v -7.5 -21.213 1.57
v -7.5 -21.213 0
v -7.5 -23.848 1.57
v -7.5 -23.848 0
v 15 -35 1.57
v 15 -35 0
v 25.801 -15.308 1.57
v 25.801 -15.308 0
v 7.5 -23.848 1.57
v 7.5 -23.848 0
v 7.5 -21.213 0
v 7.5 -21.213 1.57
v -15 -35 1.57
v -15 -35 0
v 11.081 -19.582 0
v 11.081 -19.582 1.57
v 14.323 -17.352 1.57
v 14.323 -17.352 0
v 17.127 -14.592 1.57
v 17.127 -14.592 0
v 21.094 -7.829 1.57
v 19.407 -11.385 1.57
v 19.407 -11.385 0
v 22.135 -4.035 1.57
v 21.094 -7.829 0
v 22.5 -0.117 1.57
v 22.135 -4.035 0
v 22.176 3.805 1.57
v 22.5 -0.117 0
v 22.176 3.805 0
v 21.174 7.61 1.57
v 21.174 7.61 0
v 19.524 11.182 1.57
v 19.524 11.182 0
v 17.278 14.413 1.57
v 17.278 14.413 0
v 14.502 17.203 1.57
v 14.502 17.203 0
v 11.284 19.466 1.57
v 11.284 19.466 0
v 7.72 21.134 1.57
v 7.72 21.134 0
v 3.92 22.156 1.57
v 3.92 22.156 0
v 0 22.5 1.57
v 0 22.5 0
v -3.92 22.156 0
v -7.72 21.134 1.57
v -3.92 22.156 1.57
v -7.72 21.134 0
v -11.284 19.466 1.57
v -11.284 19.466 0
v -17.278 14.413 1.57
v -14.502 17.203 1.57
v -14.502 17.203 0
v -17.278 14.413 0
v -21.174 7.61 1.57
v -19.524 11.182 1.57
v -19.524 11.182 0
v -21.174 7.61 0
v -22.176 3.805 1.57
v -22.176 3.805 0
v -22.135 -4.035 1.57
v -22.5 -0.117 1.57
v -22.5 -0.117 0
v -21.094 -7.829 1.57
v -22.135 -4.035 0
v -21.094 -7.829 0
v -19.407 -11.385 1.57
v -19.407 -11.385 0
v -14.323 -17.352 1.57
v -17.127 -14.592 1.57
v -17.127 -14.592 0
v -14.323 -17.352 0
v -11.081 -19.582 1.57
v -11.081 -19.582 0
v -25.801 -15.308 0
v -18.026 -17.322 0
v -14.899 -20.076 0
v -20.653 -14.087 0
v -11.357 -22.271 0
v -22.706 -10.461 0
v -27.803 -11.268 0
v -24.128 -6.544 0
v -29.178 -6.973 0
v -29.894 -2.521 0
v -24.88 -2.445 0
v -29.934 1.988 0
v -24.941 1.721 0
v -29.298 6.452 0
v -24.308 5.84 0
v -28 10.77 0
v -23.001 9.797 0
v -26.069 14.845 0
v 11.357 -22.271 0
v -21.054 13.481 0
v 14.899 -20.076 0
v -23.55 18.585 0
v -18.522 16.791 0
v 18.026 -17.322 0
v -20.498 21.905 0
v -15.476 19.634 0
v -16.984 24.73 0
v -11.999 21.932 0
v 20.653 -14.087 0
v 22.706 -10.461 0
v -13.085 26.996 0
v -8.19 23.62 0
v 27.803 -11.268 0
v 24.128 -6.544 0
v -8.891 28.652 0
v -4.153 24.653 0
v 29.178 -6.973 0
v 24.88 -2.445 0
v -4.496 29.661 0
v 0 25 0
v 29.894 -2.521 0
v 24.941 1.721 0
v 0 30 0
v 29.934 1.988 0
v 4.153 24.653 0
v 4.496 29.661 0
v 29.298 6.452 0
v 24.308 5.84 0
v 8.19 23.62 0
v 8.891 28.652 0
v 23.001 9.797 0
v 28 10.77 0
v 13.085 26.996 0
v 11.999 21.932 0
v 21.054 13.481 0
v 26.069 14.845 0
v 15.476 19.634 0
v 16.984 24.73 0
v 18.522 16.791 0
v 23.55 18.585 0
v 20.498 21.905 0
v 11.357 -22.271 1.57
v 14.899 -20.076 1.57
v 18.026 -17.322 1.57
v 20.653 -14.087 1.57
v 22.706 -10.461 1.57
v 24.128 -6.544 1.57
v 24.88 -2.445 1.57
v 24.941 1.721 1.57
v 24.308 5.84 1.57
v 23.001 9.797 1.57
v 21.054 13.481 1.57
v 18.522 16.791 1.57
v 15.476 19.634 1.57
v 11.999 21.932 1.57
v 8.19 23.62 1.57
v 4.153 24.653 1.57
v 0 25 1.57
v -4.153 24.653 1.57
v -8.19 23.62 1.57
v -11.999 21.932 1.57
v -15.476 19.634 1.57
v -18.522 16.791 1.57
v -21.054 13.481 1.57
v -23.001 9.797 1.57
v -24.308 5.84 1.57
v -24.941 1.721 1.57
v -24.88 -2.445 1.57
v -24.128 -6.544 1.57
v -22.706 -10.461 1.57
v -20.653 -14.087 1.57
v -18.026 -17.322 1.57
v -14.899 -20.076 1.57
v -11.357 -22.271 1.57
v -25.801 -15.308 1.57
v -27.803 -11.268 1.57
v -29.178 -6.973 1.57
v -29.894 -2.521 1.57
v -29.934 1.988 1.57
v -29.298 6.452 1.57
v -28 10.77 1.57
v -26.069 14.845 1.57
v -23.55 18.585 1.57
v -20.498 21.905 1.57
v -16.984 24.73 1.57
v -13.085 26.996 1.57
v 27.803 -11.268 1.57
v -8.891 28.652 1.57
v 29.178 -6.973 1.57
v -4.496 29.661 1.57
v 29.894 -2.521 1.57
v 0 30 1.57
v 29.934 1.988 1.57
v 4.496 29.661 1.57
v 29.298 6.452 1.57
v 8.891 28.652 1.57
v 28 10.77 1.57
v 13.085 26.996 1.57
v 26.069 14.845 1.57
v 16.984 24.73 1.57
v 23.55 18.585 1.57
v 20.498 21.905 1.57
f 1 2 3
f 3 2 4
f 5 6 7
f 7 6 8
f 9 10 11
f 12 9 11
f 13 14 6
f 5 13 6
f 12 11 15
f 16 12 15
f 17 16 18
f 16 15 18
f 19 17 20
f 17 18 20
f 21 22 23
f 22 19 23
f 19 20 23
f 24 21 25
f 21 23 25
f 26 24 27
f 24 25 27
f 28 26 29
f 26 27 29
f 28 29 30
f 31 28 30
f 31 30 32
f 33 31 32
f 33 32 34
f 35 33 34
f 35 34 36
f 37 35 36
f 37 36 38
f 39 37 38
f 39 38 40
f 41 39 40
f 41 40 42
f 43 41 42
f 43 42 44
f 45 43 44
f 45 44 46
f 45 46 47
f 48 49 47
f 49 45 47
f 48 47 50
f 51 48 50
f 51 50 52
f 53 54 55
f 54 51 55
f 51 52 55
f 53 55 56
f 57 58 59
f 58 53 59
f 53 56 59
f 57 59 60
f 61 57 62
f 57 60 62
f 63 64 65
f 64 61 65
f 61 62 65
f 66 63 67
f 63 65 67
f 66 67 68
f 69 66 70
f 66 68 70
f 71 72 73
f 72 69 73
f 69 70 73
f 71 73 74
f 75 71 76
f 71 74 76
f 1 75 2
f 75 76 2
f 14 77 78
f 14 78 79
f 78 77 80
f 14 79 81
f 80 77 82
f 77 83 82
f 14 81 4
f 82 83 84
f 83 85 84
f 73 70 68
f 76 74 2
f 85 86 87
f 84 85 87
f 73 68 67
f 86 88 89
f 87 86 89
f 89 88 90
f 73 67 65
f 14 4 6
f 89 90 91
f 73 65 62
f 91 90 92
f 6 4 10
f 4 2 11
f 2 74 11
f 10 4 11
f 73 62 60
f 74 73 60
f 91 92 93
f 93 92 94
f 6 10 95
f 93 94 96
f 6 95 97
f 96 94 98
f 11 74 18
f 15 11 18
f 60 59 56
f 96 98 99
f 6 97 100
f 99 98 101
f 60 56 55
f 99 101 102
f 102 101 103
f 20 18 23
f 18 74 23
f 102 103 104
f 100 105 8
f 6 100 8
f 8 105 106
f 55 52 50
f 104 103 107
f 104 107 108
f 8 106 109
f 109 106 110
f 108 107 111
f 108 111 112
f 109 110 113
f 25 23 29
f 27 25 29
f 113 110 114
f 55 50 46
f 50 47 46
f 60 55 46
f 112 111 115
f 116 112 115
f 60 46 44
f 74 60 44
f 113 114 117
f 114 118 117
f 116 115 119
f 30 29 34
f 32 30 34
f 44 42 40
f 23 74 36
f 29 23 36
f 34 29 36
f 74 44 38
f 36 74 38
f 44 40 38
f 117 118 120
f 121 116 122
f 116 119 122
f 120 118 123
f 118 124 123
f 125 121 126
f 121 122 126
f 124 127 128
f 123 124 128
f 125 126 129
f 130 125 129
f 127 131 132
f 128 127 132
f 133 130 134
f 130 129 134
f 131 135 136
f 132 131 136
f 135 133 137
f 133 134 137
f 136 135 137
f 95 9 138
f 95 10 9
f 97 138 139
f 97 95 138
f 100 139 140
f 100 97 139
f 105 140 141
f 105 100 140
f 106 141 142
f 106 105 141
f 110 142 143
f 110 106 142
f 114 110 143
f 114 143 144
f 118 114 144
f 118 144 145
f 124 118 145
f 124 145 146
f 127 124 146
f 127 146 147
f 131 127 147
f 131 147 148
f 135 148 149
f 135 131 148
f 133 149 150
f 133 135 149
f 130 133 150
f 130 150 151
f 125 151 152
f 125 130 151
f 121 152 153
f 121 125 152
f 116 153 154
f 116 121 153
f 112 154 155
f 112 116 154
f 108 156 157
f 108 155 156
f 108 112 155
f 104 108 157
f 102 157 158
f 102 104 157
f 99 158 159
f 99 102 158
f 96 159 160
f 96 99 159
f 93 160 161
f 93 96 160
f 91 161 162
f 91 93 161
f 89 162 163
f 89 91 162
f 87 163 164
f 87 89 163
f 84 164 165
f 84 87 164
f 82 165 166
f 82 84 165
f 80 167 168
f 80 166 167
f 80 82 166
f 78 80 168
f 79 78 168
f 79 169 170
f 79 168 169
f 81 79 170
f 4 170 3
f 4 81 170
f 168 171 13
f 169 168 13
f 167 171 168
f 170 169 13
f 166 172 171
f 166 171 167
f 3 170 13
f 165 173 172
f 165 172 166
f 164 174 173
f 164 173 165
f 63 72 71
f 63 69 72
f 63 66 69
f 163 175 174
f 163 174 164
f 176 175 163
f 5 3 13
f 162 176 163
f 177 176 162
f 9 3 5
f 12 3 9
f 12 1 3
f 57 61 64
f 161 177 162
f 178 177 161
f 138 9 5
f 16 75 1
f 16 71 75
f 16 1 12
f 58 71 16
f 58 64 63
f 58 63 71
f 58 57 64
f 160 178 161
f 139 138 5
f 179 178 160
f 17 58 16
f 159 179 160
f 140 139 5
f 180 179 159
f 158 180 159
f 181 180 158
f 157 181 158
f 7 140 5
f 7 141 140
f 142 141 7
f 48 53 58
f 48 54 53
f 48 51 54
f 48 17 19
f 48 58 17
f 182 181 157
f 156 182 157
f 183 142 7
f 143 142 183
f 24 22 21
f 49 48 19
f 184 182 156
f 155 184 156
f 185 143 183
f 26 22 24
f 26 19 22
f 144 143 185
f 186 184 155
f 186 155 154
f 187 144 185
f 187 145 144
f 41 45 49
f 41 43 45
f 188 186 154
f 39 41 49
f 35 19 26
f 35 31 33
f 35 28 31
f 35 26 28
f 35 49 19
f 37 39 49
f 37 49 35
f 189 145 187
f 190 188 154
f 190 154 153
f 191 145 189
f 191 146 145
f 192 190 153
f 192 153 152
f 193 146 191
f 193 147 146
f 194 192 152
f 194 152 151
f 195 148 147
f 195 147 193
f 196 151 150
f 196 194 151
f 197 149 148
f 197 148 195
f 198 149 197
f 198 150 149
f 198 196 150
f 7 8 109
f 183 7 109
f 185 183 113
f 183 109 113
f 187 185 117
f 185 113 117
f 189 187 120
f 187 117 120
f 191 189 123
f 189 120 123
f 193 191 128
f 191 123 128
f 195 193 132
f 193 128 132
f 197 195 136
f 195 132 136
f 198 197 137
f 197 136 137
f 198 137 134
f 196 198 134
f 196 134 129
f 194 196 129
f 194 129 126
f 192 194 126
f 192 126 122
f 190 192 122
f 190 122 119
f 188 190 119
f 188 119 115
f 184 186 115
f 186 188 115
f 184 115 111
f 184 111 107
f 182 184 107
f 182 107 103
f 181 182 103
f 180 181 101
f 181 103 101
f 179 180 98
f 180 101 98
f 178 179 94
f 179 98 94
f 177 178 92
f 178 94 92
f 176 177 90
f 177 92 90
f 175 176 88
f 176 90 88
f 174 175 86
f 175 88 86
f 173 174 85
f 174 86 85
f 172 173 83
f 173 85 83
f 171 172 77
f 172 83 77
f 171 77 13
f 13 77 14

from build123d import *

# Parameters (mm, degrees)
ESBO_O1_R           = 30
ESBO_O1_R_2         = 25
BOSS_EXTRUDE1_DEPTH = 1.57
BOSS_EXTRUDE2_START = -1.57
BOSS_EXTRUDE2_DEPTH = 1.57
BOSS_EXTRUDE3_DEPTH = 1.57
BOSS_EXTRUDE4_START = -1.57
SKETCH4_R           = 22.5
BOSS_EXTRUDE4_DEPTH = 1.57


with BuildPart() as part:
    # Esboço1 → Boss-Extrude1 (new body)
    with BuildSketch(Plane.XY):
        Circle(ESBO_O1_R)
        Circle(ESBO_O1_R_2, mode=Mode.SUBTRACT)
    extrude(amount=BOSS_EXTRUDE1_DEPTH)

    # Sketch1 → Boss-Extrude2 (add)
    with BuildSketch(Plane.XY.offset(1.57).offset(BOSS_EXTRUDE2_START)):
        with BuildLine():
            Line((-25.800536663, -15.307916512), (-15, -35))
            Line((-15, -35), (-15, -25.980762114))
            ThreePointArc((-15, -25.980762114), (-21.086686707, -21.338970071), (-25.800536663, -15.307916512))
        make_face()
        with BuildLine():
            Line((-15, -35), (0, -35))
            Line((0, -35), (0, -30))
            ThreePointArc((0, -30), (-7.764571353, -28.977774789), (-15, -25.980762114))
            Line((-15, -25.980762114), (-15, -35))
        make_face()
        with BuildLine():
            Line((0, -35), (15, -35))
            Line((15, -35), (15, -25.980762114))
            ThreePointArc((15, -25.980762114), (7.764571353, -28.977774789), (0, -30))
            Line((0, -30), (0, -35))
        make_face()
        with BuildLine():
            Line((15, -25.980762114), (15, -35))
            Line((15, -35), (25.800536663, -15.307916512))
            ThreePointArc((25.800536663, -15.307916512), (21.086686707, -21.338970071), (15, -25.980762114))
        make_face()
    extrude(amount=BOSS_EXTRUDE2_DEPTH)

    # Sketch2 → Boss-Extrude3 (add)
    with BuildSketch(Plane.XY):
        with BuildLine():
            ThreePointArc((7.5, -21.213203436), (0, -22.5), (-7.5, -21.213203436))
            Line((-7.5, -21.213203436), (-7.5, -25))
            Line((-7.5, -25), (-2.5, -25))
            Line((-2.5, -25), (2.5, -25))
            Line((2.5, -25), (7.5, -25))
            Line((7.5, -25), (7.5, -21.213203436))
        make_face()
    extrude(amount=BOSS_EXTRUDE3_DEPTH)

    # Sketch4 → Boss-Extrude4 (add)
    with BuildSketch(Plane.XY.offset(1.57).offset(BOSS_EXTRUDE4_START)):
        Circle(SKETCH4_R)
    extrude(amount=BOSS_EXTRUDE4_DEPTH)


solid = part.part
